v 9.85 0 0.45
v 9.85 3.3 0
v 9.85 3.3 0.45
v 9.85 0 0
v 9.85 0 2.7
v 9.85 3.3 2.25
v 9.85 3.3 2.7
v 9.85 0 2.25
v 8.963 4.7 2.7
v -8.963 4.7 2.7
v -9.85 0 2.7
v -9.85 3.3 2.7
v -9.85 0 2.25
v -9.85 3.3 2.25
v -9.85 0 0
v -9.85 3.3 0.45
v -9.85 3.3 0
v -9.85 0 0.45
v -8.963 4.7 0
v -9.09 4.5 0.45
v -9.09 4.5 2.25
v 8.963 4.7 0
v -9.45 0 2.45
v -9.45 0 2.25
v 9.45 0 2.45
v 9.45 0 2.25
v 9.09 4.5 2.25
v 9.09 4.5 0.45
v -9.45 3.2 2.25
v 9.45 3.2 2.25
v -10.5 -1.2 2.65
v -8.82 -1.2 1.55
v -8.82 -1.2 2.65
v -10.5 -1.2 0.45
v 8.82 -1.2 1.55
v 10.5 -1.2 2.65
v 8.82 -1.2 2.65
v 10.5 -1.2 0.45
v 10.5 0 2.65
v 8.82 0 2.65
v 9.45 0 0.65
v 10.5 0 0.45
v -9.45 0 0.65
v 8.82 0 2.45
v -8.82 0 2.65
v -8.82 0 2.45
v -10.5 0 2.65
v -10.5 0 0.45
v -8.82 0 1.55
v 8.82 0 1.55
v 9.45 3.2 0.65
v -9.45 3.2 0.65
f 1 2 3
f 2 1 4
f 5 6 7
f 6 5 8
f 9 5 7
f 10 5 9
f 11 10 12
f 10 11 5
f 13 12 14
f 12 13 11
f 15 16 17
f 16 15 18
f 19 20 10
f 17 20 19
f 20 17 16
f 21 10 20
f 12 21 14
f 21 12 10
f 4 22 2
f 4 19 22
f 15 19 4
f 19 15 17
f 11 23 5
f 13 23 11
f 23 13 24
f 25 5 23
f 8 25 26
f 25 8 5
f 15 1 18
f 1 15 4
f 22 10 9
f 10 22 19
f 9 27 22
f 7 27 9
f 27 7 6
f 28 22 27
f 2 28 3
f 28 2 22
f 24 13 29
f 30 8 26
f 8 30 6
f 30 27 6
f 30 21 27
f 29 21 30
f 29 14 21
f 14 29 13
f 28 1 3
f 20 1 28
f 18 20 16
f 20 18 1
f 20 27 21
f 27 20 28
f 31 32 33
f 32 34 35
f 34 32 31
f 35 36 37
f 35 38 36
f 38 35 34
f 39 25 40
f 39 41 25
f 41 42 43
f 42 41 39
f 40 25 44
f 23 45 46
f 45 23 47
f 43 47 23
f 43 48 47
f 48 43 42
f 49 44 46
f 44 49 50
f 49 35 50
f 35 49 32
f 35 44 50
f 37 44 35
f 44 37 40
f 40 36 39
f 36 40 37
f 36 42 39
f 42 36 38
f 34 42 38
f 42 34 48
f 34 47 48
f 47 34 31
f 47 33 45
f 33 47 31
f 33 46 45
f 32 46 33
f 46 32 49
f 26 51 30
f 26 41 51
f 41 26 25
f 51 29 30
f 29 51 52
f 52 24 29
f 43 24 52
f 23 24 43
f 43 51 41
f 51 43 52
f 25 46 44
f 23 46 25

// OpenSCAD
/**
 * Module: Placeholder model for the Raspberry Camera Module 3
 *
 * Author: Karim Aziiev <karim.aziiev@gmail.com>
 * License: GPL-3.0-or-later
 */

include <../colors.scad>
include <../parameters.scad>

use <../lib/functions.scad>
use <../lib/shapes2d.scad>
use <../lib/transforms.scad>

module camera_module_with_holes_positions() {
  translate([0,
             camera_h / 2
             - camera_holes_size[1] / 2
             - camera_bolt_hole_dia / 2
             - camera_holes_distance_from_top,
             0]) {
    children();
  }
}

module camera_module(board_color=green_2,
                     opened=true,
                     left_text="Raspberry Pi",
                     right_text="Camera Module 3",
                     left_text_size=1.2,
                     right_text_size=1.2,
                     left_text_y_offset=2.4,
                     right_text_y_offset=2.4,
                     left_text_x_offset=0,
                     right_text_x_offset=1,
                     left_text_spacing=1.3,
                     right_text_spacing=1.1) {
  max_lens_y = max([for (i = [0 : len(camera_lens_items) - 1])
    camera_lens_items[i][4] == "circle" ?
    camera_lens_items[i][0] :
    camera_lens_items[i][1]]);

  max_lens_x = max([for (i = [0 : len(camera_lens_items) - 1])
    camera_lens_items[i][0]]);

  union() {
    color(board_color, alpha=1) {
      linear_extrude(height=camera_thickness, center=false) {
        difference() {
          rounded_rect([camera_w, camera_h],
                       center=true,
                       r=camera_offset_rad,
                       fn=40);
          camera_module_with_holes_positions() {
            four_corner_holes_2d(size=camera_holes_size,
                                 center=true,
                                 d=camera_bolt_hole_dia,
                                 fn=60);
          }
        }
      }
    }

    color(yellow_2, alpha=1) {
      translate([0, 0, -0.05]) {
        linear_extrude(height=camera_thickness + 0.1, center=false) {
          translate([0,
                     camera_h / 2
                     - camera_holes_size[1] / 2
                     - camera_bolt_hole_dia / 2
                     - camera_holes_distance_from_top,
                     0]) {
            size = camera_holes_size;
            border_w = (camera_w - camera_holes_size[0] -
                        camera_bolt_hole_dia) / 2;

            for (x_ind = [0, 1]) {
              for (y_ind = [0, 1]) {
                x_pos = -size[0] / 2 + x_ind * size[0];
                y_pos = -size[1] / 2 + y_ind * size[1];
                translate([x_pos, y_pos]) {
                  ring_2d(d=camera_bolt_hole_dia,
                          w=border_w,
                          fn=30,
                          outer=true);
                }
              }
            }
          }
        }
      }
    }

    translate([0,
               camera_h / 2
               - max_lens_y / 2
               - camera_lens_distance_from_top,
               camera_thickness]) {
      for (i = [0 : len(camera_lens_items) - 1]) {
        let (spec = camera_lens_items[i],
             w = spec[0],
             h = spec[1],
             z = spec[2],
             col = spec[3],
             type = spec[4],
             fn = spec[5],
             prev_heights = [for (i = [0 : i - 1]) camera_lens_items[i][2]],
             offst = i == 0 ? 0 : sum(prev_heights)) {

          translate([0, 0, z / 2 + offst]) {
            color(col, alpha=1) {
              if (type == "cube") {
                cube([w, h, z], center=true);
              } else if (type == "circle") {
                cylinder(h=z, r=w / 2, center=true, $fn=fn);
              } else if (type == "octagon") {
                linear_extrude(height=z, center=true) {
                  chamfered_square(size=w);
                }
              }
            }
          }
        }
      }
    };

    if (!is_undef(left_text)) {
      translate([-max_lens_x / 2
                 - left_text_size
                 - left_text_x_offset,
                 -camera_h / 2
                 + left_text_y_offset,
                 camera_thickness]) {
        rotate([0, 0, 90]) {
          color("white", alpha=1) {
            linear_extrude(height=0.1, center=false) {
              text(left_text,
                   size=left_text_size,
                   spacing=left_text_spacing,
                   halign="left");
            }
          }
        }
      }
    }

    if (!is_undef(right_text)) {
      translate([max_lens_x / 2
                 + right_text_size
                 + right_text_x_offset,
                 -camera_h / 2
                 + right_text_y_offset,
                 camera_thickness]) {
        color("white", alpha=1) {
          rotate([0, 0, 90]) {
            linear_extrude(height=0.1, center=false) {
              text(right_text,
                   size=right_text_size,
                   spacing=right_text_spacing);
            }
          }
        }
      }
    }

    translate([0,
               camera_h / 2 - camera_lens_distance_from_top,
               camera_thickness]) {
      for (i = [0 : len(camera_lens_connectors) - 1]) {
        let (spec = camera_lens_connectors[i],
             w = spec[0],
             h = spec[1],
             y = spec[2],
             col = spec[3],
             type = spec[4],
             fn_or_x = spec[5],
             prev_heights = [for (i = [0 : i - 1])
               camera_lens_connectors[i][1]],
             offst = i == 0 ? 0 : sum(prev_heights)) {

          if (is_num(w)) {
            translate([-w / 2, offst, 0]) {
              color(col, alpha=1) {
                if (type == "cube") {
                  translate([is_undef(fn_or_x)
                             ? 0
                             : fn_or_x,
                             0,
                             0]) {
                    cube([w, h, y], center=false);
                  }
                } else if (type == "circle") {
                  cylinder(h=y, r=w / 2, center=false, $fn=fn_or_x);
                }
              }
            }
          }
        }
      }
    }
    translate([0,
               -camera_h / 2
               + camera_module_socket_y_offset,
               - camera_module_socket_thickness]) {
      camera_ffc_connector(opened=opened);
    }
  }
}

module camera_ffc_connector(opened=false) {
  x1 = camera_module_ffc_zif_inner_len / 2;
  x2 = x1 * 0.91;
  y1 = camera_module_socket_base_h;
  y2 = camera_module_socket_upper_h + y1;
  cutout_z_pos = (camera_module_socket_thickness
                  -
                  camera_module_ffc_inner_thickness) / 2;

  wall_thickness =
    (camera_module_socket_thickness
     - camera_module_ffc_inner_thickness) / 2;

  latch_y = opened ?
            -camera_module_ffc_zif_h
            : -camera_module_ffc_zif_base_h;

  union() {
    color(brown_1, alpha=1) {
      difference() {
        linear_extrude(height=camera_module_socket_thickness,
                       center=false) {
          polygon([[-x1, 0],
                   [-x1, y1],
                   [-x2, y2],
                   [x2, y2],
                   [x1, y1],
                   [x1, 0]]);
        }
        translate([-camera_module_ffc_zif_len / 2,
                   -0.2,
                   cutout_z_pos]) {
          cube([camera_module_ffc_zif_len,
                y2,
                camera_module_ffc_inner_thickness]);
        }
      }
    }
    translate([0,
               latch_y,
               wall_thickness]) {
      camera_module_ffc_latch();
    }
  }
}

module camera_module_ffc_latch() {
  length = camera_module_ffc_zif_len / 2;
  cut_length = length * 0.16;
  thickness = camera_module_ffc_zif_thickness;
  half_of_thickness = thickness / 2;
  x2 = length - cut_length;

  color(onyx, alpha=1) {
    translate([0, 0, thickness]) {
      rotate([-90, 0, 0]) {
        union() {
          linear_extrude(height=camera_module_ffc_zif_base_h,
                         center=false) {
            polygon([[-length, thickness],
                     [length, thickness],
                     [length, 0],
                     [x2, 0],
                     [x2, half_of_thickness],
                     [-x2, half_of_thickness],
                     [-x2, 0],
                     [-length, 0]]);
          }
          translate([-(camera_module_ffc_zif_len * 0.9) / 2,
                     -(camera_module_ffc_inner_thickness - thickness) / 2,
                     camera_module_ffc_zif_base_h]) {
            cube([camera_module_ffc_zif_len * 0.9,
                  camera_module_ffc_inner_thickness,
                  camera_module_ffc_zif_h]);
          }
        }
      }
    }
  }
}

camera_ffc_connector();

// camera_module_ffc_latch();
